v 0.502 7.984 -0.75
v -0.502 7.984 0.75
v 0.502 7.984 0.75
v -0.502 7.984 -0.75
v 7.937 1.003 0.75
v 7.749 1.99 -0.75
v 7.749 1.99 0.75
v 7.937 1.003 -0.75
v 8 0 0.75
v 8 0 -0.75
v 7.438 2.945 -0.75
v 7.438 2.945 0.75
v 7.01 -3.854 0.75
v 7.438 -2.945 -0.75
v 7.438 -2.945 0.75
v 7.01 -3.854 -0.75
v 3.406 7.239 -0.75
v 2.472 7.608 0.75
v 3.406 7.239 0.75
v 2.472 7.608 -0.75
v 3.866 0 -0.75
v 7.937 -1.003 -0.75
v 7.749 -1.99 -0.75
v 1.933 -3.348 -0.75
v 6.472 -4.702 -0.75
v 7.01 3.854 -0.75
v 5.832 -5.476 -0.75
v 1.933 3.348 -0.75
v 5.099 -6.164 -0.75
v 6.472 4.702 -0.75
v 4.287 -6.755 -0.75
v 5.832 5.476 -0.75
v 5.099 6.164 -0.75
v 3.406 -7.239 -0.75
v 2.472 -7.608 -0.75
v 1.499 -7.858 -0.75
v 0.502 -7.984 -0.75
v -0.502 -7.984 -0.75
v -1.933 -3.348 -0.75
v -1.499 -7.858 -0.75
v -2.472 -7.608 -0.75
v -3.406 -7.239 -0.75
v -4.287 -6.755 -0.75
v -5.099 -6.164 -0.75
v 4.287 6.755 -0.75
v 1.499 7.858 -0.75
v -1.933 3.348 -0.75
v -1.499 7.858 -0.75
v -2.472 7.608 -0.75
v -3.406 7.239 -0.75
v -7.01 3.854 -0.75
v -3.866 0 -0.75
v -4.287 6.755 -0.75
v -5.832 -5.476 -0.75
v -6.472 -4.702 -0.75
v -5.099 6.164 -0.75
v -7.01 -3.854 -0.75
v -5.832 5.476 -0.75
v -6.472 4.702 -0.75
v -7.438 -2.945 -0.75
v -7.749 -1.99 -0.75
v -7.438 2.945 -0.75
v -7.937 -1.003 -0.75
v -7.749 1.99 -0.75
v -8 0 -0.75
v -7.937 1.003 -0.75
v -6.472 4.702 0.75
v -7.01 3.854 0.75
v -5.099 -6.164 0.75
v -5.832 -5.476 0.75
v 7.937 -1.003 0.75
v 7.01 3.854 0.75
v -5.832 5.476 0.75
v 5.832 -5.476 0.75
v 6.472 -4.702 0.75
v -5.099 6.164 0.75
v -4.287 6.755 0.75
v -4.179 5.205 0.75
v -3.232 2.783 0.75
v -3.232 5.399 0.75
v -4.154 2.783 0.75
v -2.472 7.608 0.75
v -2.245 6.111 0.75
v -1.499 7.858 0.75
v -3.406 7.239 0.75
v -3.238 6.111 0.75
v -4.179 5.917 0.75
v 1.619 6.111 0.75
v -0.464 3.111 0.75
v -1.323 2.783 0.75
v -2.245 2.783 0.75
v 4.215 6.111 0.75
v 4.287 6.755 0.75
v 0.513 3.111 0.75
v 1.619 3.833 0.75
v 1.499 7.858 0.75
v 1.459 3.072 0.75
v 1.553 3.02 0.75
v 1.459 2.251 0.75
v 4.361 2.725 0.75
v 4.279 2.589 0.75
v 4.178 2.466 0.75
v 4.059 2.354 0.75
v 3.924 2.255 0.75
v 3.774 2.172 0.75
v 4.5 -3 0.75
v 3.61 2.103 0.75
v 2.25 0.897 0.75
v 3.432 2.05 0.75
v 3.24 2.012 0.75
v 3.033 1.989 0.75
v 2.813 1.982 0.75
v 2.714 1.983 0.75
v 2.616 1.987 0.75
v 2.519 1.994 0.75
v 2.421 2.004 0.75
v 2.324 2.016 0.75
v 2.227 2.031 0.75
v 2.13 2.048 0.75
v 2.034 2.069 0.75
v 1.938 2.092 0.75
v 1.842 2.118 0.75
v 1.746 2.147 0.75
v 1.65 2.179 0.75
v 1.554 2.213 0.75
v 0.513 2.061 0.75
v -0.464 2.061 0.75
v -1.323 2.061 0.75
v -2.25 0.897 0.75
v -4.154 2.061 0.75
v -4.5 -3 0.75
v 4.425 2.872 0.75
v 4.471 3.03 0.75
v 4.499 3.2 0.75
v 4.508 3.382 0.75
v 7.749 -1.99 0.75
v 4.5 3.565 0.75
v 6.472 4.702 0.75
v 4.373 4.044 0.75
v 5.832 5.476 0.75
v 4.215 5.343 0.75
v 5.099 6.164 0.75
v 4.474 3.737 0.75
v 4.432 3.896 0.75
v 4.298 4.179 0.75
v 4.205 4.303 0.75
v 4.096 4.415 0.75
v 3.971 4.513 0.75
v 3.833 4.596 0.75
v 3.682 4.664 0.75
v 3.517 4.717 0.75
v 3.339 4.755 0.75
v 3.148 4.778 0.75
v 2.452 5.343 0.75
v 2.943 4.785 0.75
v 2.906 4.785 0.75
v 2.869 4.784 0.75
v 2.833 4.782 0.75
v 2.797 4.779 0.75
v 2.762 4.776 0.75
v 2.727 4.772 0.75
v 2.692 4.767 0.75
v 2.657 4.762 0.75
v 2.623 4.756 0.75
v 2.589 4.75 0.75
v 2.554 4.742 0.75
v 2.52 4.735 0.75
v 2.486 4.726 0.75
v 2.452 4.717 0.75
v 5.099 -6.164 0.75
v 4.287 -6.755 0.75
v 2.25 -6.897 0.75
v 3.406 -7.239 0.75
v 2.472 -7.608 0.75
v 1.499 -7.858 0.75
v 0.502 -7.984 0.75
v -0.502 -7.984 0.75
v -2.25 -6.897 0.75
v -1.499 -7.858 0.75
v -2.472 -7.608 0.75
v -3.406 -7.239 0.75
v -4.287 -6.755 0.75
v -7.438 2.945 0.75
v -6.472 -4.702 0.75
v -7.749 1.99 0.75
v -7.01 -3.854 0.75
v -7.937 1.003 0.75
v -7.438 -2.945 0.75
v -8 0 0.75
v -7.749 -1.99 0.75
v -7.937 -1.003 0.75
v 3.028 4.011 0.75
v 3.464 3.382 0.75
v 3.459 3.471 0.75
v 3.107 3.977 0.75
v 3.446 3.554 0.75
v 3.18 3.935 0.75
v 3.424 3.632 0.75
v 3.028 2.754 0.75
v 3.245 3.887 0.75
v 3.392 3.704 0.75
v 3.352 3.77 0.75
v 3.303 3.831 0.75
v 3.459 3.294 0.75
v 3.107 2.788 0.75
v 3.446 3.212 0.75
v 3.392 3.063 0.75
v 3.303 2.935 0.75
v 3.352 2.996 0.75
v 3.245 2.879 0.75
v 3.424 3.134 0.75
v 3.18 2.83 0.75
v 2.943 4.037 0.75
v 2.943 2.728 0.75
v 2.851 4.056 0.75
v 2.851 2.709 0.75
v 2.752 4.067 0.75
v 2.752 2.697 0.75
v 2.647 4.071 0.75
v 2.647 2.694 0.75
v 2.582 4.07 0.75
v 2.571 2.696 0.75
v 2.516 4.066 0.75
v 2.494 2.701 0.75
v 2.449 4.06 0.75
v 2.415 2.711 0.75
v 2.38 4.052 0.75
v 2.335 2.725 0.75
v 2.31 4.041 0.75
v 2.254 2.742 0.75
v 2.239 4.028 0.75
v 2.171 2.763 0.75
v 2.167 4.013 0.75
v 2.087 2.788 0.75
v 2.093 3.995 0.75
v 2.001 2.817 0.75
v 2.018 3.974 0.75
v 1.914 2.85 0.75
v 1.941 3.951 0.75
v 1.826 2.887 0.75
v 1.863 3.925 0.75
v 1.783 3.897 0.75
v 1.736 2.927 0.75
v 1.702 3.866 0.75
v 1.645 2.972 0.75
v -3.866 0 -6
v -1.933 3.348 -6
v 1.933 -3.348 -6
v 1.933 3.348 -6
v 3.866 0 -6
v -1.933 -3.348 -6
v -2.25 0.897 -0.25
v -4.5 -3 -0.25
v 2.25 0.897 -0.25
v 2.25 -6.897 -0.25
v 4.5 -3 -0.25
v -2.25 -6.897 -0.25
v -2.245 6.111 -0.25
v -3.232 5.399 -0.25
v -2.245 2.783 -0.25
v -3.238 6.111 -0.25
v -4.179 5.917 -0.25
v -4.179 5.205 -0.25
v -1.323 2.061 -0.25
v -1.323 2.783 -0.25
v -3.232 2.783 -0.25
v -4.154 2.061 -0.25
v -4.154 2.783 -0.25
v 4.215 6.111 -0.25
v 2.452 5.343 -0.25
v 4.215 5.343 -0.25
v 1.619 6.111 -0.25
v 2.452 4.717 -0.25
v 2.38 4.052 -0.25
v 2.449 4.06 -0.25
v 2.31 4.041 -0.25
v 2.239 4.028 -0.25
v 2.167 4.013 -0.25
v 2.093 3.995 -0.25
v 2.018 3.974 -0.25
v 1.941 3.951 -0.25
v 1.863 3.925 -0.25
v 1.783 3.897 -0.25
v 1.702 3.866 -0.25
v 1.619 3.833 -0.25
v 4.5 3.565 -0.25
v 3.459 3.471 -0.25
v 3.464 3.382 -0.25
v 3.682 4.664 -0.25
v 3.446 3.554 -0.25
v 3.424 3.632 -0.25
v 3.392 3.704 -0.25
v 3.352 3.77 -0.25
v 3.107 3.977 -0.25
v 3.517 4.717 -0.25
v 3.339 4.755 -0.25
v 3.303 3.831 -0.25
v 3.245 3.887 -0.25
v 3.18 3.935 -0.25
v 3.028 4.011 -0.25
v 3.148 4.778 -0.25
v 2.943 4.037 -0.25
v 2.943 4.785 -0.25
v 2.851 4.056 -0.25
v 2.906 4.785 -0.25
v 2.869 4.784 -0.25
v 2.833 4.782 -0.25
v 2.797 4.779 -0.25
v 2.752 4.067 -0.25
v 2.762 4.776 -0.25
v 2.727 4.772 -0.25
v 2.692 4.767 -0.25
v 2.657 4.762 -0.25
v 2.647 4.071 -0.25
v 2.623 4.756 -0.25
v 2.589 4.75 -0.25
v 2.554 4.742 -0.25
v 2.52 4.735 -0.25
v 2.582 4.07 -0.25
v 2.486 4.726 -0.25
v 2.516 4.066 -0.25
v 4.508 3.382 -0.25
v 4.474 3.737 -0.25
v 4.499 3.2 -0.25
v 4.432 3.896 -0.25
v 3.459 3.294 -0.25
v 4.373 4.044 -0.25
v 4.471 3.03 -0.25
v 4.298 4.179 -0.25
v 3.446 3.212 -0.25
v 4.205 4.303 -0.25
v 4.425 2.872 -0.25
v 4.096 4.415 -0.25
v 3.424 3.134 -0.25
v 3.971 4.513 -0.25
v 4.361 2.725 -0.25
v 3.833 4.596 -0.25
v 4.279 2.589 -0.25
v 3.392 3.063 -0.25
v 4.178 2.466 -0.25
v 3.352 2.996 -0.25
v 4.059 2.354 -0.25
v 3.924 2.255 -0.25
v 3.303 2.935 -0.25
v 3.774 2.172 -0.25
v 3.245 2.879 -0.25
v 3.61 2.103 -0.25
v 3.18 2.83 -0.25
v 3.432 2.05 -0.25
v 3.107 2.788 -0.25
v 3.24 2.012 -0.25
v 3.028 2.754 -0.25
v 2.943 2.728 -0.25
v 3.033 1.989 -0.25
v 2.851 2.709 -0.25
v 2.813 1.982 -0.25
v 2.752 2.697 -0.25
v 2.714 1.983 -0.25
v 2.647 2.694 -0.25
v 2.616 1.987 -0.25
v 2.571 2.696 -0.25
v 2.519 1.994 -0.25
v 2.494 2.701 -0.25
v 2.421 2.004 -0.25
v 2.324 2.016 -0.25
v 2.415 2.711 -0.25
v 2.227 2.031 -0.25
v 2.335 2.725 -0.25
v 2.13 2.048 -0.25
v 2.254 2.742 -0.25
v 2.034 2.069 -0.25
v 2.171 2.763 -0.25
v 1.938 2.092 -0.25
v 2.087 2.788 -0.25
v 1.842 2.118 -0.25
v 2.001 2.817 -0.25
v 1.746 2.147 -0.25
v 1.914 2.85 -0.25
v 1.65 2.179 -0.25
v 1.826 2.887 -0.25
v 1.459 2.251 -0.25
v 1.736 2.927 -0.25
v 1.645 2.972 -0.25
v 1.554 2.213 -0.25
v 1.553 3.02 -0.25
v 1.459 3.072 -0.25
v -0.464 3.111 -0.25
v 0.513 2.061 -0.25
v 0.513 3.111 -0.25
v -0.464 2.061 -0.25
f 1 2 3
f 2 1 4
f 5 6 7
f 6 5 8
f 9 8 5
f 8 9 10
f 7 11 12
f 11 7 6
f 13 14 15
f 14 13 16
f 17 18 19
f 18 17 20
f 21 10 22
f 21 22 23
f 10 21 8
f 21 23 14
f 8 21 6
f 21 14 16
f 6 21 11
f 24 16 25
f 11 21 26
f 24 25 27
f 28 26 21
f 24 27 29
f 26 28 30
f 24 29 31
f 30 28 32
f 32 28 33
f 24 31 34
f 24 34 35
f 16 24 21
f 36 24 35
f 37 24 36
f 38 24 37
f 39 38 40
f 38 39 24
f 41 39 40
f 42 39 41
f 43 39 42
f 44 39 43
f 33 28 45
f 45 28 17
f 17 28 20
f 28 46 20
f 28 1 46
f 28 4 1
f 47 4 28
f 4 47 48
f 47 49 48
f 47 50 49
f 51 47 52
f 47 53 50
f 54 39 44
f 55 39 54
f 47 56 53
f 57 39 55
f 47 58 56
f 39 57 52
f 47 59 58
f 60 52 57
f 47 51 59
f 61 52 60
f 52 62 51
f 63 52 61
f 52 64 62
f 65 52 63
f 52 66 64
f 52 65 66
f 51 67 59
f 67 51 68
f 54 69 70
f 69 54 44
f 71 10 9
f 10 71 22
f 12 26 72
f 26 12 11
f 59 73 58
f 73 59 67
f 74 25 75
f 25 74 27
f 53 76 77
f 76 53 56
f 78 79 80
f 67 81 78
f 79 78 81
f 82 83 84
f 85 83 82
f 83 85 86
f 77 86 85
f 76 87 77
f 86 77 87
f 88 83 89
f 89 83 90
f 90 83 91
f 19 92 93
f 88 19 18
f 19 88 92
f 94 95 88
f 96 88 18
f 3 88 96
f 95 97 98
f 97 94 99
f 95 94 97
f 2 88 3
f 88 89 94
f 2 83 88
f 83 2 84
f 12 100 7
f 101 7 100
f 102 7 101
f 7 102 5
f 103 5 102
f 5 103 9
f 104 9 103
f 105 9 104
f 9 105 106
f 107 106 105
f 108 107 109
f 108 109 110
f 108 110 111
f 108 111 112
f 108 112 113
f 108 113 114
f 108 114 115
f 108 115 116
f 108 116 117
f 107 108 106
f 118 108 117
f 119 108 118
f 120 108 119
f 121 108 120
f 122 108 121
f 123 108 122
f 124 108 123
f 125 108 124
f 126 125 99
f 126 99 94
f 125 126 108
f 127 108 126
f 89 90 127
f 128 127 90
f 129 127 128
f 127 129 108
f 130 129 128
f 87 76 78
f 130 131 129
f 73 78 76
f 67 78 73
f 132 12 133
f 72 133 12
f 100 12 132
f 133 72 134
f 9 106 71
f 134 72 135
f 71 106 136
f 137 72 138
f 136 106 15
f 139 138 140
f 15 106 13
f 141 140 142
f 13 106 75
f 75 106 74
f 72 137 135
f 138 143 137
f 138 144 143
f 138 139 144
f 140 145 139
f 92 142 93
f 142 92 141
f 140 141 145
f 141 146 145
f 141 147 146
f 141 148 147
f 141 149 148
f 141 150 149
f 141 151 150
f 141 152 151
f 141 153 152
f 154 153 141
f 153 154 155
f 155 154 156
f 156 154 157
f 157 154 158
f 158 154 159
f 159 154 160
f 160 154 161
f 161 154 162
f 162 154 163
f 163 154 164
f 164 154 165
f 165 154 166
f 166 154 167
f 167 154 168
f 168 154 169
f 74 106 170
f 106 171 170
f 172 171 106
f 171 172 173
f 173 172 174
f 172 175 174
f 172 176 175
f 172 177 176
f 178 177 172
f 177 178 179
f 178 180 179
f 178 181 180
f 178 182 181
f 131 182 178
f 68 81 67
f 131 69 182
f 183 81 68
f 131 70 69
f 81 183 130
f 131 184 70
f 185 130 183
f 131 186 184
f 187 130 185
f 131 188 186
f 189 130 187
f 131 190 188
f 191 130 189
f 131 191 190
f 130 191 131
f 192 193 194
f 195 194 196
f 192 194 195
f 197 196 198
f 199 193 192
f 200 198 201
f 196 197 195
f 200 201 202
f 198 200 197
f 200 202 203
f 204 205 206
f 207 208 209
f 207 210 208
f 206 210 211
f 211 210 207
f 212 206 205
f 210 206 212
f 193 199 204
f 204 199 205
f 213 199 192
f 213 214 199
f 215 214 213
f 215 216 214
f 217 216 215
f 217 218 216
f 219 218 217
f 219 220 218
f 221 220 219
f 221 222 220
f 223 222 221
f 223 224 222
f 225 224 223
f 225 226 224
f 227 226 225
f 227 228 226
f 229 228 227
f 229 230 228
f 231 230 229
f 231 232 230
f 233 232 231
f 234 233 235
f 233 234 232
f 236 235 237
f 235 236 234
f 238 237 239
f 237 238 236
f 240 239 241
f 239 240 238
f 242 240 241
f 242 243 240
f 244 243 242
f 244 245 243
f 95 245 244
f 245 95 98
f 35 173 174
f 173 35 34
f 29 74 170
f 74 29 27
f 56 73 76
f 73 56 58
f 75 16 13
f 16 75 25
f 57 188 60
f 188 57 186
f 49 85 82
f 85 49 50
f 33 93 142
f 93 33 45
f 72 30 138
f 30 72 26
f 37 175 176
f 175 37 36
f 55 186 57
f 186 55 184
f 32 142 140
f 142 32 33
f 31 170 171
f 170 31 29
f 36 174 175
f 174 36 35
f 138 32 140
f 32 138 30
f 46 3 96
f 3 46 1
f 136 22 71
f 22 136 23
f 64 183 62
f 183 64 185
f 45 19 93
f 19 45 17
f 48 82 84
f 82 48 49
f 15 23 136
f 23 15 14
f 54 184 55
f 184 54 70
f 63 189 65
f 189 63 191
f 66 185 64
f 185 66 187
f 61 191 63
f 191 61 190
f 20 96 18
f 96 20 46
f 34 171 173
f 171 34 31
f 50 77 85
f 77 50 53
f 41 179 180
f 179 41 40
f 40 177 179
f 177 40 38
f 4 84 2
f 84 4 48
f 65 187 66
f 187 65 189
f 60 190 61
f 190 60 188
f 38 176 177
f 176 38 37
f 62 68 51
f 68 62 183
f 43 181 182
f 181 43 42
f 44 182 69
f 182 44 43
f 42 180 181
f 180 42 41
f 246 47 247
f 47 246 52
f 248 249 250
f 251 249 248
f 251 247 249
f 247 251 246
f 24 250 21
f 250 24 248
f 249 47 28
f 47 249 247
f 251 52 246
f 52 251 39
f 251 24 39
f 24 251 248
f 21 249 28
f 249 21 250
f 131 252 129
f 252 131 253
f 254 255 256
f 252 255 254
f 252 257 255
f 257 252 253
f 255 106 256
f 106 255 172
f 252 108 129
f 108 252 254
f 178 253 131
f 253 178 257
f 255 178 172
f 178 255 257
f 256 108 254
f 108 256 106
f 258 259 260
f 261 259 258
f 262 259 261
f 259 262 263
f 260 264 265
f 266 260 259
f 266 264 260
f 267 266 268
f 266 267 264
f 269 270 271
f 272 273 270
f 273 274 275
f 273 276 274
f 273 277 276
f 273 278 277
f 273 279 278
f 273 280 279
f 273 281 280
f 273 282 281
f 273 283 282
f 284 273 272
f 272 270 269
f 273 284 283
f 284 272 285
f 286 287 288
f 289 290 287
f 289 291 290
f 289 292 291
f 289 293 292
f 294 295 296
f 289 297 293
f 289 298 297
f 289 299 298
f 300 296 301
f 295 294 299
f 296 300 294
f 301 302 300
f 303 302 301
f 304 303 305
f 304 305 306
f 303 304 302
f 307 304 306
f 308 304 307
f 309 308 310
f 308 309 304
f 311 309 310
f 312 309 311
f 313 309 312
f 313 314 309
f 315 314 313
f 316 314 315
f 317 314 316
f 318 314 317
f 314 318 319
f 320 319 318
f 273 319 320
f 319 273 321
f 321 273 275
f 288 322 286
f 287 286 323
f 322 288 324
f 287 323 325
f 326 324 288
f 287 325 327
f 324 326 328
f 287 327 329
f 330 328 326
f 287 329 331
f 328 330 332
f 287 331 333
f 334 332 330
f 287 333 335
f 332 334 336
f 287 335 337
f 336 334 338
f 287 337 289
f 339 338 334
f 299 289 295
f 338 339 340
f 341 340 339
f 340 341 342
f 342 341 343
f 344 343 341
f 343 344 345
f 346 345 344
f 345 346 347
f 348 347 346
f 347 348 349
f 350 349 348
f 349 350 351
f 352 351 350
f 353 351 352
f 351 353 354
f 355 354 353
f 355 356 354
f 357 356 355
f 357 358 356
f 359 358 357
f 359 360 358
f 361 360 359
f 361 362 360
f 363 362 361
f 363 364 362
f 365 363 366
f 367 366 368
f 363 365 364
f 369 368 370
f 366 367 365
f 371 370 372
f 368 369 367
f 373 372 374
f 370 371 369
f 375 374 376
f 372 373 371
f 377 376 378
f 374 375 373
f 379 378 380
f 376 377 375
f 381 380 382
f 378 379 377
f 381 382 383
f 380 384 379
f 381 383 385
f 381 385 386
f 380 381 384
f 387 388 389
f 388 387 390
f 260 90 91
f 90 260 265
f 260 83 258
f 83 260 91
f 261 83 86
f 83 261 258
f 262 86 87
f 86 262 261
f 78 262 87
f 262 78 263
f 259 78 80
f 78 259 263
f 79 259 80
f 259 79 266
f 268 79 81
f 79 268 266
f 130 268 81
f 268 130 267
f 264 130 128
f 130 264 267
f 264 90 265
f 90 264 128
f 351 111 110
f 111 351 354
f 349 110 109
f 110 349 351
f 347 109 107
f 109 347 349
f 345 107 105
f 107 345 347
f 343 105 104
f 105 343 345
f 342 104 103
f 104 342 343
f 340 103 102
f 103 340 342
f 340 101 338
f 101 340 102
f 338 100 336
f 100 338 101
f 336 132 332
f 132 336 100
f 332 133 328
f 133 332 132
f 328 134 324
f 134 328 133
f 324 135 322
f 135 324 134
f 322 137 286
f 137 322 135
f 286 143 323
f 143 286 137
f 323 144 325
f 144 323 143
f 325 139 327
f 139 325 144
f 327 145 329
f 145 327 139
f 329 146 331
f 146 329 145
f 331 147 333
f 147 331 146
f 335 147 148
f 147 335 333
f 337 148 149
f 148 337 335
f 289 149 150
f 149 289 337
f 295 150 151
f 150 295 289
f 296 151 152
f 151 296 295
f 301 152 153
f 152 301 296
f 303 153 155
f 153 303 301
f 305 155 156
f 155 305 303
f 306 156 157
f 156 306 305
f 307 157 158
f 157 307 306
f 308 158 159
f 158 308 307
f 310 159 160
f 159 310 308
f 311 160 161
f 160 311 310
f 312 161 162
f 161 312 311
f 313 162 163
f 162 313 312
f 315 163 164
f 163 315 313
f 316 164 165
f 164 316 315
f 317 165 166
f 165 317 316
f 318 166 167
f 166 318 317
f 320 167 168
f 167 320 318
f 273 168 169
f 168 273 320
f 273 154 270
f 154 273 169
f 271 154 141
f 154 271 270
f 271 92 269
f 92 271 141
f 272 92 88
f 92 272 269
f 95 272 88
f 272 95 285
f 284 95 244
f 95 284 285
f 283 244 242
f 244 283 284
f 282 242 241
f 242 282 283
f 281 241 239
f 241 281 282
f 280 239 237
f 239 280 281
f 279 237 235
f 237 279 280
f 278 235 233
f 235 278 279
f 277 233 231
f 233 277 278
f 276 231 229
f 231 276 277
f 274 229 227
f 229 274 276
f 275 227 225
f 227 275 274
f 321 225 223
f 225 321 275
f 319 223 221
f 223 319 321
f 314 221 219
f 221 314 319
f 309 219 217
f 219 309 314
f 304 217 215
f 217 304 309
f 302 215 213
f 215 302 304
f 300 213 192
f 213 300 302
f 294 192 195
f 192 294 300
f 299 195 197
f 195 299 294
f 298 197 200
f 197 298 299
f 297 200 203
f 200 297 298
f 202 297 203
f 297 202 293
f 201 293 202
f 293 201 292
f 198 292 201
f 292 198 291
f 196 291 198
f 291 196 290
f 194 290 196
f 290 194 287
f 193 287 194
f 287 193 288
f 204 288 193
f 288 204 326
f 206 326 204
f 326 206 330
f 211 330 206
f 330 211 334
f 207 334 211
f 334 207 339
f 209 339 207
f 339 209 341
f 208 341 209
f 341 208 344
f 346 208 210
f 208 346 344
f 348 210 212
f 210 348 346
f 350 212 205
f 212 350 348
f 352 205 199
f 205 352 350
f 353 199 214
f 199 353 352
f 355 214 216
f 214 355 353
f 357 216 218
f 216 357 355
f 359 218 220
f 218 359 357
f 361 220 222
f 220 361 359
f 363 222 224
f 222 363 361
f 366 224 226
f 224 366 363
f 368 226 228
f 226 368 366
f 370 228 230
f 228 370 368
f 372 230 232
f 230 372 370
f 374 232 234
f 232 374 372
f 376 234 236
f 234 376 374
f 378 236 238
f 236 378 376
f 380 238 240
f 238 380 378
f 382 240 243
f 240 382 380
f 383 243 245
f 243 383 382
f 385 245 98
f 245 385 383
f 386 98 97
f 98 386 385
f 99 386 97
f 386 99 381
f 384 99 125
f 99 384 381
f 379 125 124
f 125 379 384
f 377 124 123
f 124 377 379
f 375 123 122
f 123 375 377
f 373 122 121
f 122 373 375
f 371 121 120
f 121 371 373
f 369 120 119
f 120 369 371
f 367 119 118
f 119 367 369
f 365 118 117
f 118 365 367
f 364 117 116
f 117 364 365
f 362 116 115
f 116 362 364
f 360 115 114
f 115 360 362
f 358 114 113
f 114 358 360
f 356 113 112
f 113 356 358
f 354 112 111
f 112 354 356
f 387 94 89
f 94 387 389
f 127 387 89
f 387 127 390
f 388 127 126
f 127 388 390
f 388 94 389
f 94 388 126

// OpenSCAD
$fn = 50;


difference() {
	union() {
		translate(v = [0, 0, -0.7500000000]) {
			cylinder(h = 1.5000000000, r = 8.0000000000);
		}
		translate(v = [0, 0, -6]) {
			linear_extrude(height = 6) {
				polygon(points = [[3.8658550000, 0.0000000000], [1.9329275000, 3.3479286373], [-1.9329275000, 3.3479286373], [-3.8658550000, 0.0000000000], [-1.9329275000, -3.3479286373], [1.9329275000, -3.3479286373]]);
			}
		}
	}
	union() {
		translate(v = [0, -3, -0.2500000000]) {
			#linear_extrude(height = 1) {
				polygon(points = [[4.5000000000, 0.0000000000], [2.2500000000, 3.8971143170], [-2.2500000000, 3.8971143170], [-4.5000000000, 0.0000000000], [-2.2500000000, -3.8971143170], [2.2500000000, -3.8971143170]]);
			}
		}
		#translate(v = [0, 4, -0.2500000000]) {
			linear_extrude(height = 1) {
				text(font = "SegoiUI:Bold", halign = "center", size = 4, text = "1.5", valign = "center");
			}
		}
	}
}
